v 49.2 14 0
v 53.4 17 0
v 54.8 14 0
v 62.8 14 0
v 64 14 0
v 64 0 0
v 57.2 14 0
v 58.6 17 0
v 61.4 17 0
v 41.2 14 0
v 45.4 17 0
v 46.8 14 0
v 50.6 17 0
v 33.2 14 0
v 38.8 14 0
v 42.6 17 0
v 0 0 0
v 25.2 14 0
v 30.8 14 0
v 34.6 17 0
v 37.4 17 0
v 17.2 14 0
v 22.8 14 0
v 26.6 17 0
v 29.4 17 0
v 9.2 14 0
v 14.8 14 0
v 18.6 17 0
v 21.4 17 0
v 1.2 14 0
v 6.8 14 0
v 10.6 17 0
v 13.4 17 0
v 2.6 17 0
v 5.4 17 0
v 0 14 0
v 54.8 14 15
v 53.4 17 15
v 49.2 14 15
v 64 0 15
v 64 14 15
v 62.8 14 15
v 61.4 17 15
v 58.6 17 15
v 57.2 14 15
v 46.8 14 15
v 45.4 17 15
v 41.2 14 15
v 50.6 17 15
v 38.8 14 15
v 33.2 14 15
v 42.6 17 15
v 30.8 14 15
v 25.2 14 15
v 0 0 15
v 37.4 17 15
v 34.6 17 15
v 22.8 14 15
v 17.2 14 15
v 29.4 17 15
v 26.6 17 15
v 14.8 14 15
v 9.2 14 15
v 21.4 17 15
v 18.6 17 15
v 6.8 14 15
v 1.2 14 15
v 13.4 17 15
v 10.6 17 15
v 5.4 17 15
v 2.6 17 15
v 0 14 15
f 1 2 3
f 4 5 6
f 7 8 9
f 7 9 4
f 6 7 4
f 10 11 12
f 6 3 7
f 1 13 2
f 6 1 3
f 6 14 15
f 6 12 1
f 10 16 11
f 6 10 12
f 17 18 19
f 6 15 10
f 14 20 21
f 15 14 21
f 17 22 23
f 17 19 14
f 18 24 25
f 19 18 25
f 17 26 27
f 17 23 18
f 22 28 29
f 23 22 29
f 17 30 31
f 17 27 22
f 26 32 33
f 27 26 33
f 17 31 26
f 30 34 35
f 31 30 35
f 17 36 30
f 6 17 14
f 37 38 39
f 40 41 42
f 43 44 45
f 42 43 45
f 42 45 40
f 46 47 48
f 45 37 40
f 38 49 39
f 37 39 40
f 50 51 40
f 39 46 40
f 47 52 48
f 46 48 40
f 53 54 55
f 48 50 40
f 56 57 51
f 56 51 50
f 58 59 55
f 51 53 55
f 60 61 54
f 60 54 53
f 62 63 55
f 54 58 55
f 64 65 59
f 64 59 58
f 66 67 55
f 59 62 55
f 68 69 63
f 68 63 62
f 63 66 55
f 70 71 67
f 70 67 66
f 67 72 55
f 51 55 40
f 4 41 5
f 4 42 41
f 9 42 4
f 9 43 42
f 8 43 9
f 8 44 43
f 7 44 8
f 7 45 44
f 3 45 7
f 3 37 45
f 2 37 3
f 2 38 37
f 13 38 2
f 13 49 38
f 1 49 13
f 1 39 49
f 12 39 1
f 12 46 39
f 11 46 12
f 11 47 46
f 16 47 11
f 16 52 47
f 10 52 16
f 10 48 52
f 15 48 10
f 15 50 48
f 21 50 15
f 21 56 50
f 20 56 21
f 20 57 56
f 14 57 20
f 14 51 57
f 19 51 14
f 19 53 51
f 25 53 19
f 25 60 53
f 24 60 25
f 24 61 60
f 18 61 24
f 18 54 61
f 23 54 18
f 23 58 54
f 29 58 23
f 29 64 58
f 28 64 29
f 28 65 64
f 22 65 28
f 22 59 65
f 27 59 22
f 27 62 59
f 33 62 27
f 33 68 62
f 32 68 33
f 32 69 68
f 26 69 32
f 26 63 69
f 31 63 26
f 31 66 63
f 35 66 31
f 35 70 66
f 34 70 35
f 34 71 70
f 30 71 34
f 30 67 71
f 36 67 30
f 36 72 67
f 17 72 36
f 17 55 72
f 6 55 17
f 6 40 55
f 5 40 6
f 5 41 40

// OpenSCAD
$fn = 32;

// ----------------------------------------------------------------------
// Gear rack: 8 teeth, pitch 8 mm
// ----------------------------------------------------------------------

// --- parameters (mm) ---
teeth = 8;                // number of teeth
pitch = 8;                // tooth pitch, X
root_w = 5.6;             // tooth width at the root
tip_w = 2.8;              // tooth width at the tip
base_h = 14;              // rack body height, Y
tooth_h = 3;              // tooth height above the body
plate_t = 15;             // rack width, Z (extrusion height)
fit_tol = 0.1;            // declared fit tolerance (prompt contract)
free_tol = 0.3;           // declared free tolerance (prompt contract)

rack_l = teeth * pitch;  // overall length
total_h = base_h + tooth_h;  // overall height

profile = [[0, 0], [64, 0], [64, 14], [62.8, 14], [61.4, 17], [58.6, 17], [57.2, 14], [54.8, 14], [53.4, 17], [50.6, 17], [49.2, 14], [46.8, 14], [45.4, 17], [42.6, 17], [41.2, 14], [38.8, 14], [37.4, 17], [34.6, 17], [33.2, 14], [30.8, 14], [29.4, 17], [26.6, 17], [25.2, 14], [22.8, 14], [21.4, 17], [18.6, 17], [17.2, 14], [14.8, 14], [13.4, 17], [10.6, 17], [9.2, 14], [6.8, 14], [5.4, 17], [2.6, 17], [1.2, 14], [0, 14]];  // primary outline, 36 points, counter clockwise

// --- the one profile operation ---
linear_extrude(height = plate_t) polygon(points = profile);
